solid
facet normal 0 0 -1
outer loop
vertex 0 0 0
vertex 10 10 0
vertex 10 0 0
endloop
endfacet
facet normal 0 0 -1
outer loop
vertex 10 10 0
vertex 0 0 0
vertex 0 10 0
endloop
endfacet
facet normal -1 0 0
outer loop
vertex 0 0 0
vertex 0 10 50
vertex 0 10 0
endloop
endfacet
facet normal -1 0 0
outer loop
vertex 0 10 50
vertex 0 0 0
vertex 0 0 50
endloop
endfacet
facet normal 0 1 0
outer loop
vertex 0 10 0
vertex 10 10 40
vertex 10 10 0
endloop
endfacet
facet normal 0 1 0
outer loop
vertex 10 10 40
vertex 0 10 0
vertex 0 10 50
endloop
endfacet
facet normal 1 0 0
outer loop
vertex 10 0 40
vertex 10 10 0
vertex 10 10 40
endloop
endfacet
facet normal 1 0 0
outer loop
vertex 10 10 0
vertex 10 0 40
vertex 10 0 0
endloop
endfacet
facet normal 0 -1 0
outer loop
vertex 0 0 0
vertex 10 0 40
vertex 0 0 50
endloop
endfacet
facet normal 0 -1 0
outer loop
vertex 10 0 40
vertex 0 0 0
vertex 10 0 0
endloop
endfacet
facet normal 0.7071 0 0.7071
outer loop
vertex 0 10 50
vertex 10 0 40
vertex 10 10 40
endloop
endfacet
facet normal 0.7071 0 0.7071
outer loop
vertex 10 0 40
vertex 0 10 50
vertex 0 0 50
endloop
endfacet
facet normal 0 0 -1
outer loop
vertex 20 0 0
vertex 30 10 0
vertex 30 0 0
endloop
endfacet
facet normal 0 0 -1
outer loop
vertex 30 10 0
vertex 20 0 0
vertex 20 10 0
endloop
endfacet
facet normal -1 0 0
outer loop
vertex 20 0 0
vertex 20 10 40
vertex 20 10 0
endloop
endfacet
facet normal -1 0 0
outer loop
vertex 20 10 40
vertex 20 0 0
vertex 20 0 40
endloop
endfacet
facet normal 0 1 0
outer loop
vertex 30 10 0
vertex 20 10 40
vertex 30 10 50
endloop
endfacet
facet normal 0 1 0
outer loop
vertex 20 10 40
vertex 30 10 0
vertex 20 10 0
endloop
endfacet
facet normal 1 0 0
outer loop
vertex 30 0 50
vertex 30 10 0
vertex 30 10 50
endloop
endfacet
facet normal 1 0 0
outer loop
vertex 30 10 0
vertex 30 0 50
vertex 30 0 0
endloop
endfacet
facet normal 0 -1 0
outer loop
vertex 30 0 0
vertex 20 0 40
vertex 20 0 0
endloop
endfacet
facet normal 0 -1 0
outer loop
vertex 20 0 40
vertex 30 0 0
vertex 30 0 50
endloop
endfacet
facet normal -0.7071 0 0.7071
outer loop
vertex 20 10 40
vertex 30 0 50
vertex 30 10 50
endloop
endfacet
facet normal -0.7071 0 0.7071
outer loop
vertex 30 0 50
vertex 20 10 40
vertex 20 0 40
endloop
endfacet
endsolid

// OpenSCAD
module post(thickness, lenght, angle) {
  cutstart=sqrt(pow((1/sin(angle)),2)-1);
  cutend=sqrt(pow(((thickness+2)/sin(angle)),2)-pow(thickness+2,2));

  difference() {
    linear_extrude(lenght)
      square(thickness);
    translate([-1,-1,lenght+cutstart])
      rotate([-90,0,0])
        linear_extrude(thickness+2)
          if(angle > 0) {
            polygon([[0,0],[thickness+2,cutend],[thickness+2,0]]);
          } else {
            polygon([[thickness+2,0],[0,cutend],[0,0]]);
          }
  }
}

post(10,50,45);
translate([20,0,0])
  post(10,50,-45);
